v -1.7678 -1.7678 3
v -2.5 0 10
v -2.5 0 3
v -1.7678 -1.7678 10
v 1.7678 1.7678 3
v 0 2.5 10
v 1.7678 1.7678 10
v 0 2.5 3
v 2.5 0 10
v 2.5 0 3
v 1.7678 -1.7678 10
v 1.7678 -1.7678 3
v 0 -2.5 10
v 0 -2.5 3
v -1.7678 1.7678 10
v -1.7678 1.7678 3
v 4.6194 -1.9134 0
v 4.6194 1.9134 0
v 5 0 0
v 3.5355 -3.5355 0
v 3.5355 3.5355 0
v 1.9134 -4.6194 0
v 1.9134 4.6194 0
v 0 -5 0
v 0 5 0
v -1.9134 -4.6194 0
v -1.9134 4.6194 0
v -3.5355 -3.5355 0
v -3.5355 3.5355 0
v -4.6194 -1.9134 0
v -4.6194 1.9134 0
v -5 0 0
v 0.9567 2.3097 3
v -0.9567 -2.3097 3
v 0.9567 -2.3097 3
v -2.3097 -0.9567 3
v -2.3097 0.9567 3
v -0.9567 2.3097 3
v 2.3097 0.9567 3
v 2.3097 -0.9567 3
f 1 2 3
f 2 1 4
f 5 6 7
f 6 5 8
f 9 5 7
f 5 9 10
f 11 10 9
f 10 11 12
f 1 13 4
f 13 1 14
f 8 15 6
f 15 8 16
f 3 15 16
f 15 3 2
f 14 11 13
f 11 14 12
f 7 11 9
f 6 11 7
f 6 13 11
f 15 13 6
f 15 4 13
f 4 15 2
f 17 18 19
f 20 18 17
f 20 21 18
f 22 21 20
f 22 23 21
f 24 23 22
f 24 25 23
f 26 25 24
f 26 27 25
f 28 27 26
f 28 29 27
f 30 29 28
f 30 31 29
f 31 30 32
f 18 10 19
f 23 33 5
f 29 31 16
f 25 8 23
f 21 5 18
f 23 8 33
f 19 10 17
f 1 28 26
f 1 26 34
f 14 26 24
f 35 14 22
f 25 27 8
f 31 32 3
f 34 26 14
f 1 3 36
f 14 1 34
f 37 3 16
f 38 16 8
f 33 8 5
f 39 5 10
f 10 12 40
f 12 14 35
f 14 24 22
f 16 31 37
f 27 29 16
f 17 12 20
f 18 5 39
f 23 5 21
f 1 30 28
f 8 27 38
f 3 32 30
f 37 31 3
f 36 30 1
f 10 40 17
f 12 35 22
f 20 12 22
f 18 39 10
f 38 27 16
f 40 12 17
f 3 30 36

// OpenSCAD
module screw(thickness,deep, radius){
	union(){
			cylinder(deep,radius,radius,false);
			cylinder(thickness,2*radius,radius,false);
	}
};

screw(3,10,2.5);
